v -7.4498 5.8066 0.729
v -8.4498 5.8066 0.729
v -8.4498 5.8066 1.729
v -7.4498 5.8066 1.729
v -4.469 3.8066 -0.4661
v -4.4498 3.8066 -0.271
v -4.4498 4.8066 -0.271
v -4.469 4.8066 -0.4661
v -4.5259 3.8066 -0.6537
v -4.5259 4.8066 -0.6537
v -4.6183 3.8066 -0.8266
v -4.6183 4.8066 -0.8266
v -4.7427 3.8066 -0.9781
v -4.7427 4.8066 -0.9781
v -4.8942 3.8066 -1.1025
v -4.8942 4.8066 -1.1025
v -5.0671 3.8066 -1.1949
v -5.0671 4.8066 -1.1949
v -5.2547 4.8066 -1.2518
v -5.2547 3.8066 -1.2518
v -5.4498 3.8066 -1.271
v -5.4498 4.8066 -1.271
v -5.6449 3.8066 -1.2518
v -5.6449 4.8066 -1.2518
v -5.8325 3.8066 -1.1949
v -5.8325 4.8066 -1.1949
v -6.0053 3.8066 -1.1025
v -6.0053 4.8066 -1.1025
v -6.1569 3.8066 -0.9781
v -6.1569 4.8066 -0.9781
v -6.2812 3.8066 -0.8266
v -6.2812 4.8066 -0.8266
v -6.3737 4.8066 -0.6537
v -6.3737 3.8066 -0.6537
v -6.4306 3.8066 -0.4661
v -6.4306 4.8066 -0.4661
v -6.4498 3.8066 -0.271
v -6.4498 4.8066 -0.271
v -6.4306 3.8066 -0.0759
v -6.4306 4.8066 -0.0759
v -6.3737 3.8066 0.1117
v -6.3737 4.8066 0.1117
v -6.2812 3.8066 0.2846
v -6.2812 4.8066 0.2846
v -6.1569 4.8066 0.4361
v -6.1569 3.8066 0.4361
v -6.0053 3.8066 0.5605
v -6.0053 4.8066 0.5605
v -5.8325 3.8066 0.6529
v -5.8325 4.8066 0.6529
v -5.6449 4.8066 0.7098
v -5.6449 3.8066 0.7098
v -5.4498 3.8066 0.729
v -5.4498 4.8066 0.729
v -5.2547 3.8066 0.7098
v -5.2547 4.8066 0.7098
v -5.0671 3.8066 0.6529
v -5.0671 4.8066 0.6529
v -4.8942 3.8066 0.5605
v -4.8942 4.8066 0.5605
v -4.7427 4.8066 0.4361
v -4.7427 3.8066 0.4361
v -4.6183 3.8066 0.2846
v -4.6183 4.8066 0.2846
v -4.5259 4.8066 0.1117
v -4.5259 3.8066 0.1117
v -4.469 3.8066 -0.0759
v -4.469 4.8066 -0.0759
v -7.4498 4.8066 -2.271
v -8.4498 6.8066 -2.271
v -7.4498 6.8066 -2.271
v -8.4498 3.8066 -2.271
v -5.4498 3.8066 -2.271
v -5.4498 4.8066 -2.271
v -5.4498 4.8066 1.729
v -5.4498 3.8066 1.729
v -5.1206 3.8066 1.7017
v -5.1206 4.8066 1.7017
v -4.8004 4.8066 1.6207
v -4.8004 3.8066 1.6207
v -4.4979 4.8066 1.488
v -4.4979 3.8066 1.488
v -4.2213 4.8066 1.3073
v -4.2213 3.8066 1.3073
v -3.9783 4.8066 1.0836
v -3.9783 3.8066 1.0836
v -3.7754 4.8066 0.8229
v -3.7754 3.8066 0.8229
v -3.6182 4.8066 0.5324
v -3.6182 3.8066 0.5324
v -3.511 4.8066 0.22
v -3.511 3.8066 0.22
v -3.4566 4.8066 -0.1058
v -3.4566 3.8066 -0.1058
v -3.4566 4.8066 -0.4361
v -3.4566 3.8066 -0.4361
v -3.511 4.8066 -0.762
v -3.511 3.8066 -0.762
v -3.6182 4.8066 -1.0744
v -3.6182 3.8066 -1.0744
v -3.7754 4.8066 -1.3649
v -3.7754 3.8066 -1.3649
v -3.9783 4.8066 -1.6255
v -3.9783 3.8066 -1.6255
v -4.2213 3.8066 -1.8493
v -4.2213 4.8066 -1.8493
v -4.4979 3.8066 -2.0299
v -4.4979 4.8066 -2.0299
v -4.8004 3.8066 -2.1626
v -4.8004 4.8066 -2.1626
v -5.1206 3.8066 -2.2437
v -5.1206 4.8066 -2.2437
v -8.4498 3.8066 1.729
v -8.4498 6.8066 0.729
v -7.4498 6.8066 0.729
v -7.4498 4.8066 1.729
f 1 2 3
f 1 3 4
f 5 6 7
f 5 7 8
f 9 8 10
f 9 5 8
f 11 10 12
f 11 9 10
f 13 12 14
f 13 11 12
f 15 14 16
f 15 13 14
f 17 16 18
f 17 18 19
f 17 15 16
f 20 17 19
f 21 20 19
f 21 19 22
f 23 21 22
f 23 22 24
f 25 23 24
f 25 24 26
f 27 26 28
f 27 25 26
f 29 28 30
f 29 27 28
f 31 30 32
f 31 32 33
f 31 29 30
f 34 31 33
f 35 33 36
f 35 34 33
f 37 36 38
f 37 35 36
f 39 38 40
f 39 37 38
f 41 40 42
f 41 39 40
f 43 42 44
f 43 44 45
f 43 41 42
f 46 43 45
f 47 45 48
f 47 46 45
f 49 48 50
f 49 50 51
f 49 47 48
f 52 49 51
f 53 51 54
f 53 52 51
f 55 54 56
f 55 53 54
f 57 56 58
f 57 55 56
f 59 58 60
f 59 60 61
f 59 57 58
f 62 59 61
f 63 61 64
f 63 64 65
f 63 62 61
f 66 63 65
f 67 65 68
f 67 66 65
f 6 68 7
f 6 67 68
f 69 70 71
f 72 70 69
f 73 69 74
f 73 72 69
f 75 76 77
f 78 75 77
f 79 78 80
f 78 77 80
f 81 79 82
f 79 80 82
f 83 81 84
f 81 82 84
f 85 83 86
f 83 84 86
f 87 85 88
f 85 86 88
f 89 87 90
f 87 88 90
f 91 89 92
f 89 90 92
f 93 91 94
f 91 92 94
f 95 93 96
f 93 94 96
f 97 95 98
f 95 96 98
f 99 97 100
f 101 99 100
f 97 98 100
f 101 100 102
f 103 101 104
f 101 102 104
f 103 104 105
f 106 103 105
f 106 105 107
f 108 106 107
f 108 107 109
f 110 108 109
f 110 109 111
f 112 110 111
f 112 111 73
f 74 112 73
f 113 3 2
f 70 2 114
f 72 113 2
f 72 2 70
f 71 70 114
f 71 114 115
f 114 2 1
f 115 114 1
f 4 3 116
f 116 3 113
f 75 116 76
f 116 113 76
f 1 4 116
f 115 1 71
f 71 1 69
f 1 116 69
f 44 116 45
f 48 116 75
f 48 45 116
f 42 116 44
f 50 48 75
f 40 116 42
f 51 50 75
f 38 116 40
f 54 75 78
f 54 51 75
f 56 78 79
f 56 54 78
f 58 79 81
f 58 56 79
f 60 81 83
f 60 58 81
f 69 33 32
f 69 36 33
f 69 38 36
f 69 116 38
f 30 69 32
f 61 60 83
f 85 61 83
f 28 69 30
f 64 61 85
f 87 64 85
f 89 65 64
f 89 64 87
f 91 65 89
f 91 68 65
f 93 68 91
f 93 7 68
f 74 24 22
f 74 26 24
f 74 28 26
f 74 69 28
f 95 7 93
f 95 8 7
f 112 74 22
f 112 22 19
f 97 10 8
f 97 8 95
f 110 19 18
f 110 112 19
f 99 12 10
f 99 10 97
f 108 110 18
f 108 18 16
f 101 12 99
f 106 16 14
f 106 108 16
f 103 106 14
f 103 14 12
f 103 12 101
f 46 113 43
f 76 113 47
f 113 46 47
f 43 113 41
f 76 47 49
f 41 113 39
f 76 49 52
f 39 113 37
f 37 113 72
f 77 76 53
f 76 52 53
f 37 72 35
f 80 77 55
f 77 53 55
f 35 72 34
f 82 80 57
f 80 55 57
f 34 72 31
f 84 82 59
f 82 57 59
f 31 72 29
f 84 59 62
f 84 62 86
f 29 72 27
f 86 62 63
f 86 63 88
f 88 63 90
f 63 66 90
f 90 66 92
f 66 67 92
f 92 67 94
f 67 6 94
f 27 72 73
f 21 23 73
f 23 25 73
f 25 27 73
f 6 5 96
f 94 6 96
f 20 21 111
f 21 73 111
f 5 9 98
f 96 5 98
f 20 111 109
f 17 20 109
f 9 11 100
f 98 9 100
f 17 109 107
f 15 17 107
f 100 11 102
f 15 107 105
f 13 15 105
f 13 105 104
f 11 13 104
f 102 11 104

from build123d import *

# Parameters (mm, degrees)
SKETCH_1_R      = 5
EXTRUDE_1_DEPTH = 5
SKETCH_1_3_W    = 5
SKETCH_1_3_H    = 5
EXTRUDE_2_DEPTH = 10
SKETCH_1_4_W    = 5
SKETCH_1_4_H    = 15
EXTRUDE_3_DEPTH = 15
SCALE_1_SCALE   = 0.2


with BuildPart() as part:
    # 草圖1 → 填料-伸長1 (new body)
    with BuildSketch(Plane(origin=(0, 0, 0), x_dir=(1, 0, 0), z_dir=(0, 1, 0))):
        with BuildLine():
            ThreePointArc((0, -10), (10, 0), (0, 10))
            Line((0, 10), (-10, 10))
            Line((-10, 10), (-10, -5))
            Line((-10, -5), (-10, -10))
            Line((-10, -10), (0, -10))
        make_face()
        Circle(SKETCH_1_R, mode=Mode.SUBTRACT)
    extrude(amount=EXTRUDE_1_DEPTH)

    # 草圖1<3> → 填料-伸長2 (add)
    with BuildSketch(Plane(origin=(0, 0, 0), x_dir=(1, 0, 0), z_dir=(0, 1, 0))):
        with Locations((-12.5, -7.5)):
            Rectangle(SKETCH_1_3_W, SKETCH_1_3_H)
    extrude(amount=EXTRUDE_2_DEPTH)

    # 草圖1<4> → 填料-伸長3 (add)
    with BuildSketch(Plane(origin=(0, 0, 0), x_dir=(1, 0, 0), z_dir=(0, 1, 0))):
        with Locations((-12.5, 2.5)):
            Rectangle(SKETCH_1_4_W, SKETCH_1_4_H)
    extrude(amount=EXTRUDE_3_DEPTH)


with BuildPart() as part_1:
    # 縮放比例1: scaled about (-6.812216975, 4.758193472, -0.338729021)
    add(part.part.scale(SCALE_1_SCALE).moved(Location((-5.44977358, 3.806554778, -0.270983217))))


solid = part_1.part
